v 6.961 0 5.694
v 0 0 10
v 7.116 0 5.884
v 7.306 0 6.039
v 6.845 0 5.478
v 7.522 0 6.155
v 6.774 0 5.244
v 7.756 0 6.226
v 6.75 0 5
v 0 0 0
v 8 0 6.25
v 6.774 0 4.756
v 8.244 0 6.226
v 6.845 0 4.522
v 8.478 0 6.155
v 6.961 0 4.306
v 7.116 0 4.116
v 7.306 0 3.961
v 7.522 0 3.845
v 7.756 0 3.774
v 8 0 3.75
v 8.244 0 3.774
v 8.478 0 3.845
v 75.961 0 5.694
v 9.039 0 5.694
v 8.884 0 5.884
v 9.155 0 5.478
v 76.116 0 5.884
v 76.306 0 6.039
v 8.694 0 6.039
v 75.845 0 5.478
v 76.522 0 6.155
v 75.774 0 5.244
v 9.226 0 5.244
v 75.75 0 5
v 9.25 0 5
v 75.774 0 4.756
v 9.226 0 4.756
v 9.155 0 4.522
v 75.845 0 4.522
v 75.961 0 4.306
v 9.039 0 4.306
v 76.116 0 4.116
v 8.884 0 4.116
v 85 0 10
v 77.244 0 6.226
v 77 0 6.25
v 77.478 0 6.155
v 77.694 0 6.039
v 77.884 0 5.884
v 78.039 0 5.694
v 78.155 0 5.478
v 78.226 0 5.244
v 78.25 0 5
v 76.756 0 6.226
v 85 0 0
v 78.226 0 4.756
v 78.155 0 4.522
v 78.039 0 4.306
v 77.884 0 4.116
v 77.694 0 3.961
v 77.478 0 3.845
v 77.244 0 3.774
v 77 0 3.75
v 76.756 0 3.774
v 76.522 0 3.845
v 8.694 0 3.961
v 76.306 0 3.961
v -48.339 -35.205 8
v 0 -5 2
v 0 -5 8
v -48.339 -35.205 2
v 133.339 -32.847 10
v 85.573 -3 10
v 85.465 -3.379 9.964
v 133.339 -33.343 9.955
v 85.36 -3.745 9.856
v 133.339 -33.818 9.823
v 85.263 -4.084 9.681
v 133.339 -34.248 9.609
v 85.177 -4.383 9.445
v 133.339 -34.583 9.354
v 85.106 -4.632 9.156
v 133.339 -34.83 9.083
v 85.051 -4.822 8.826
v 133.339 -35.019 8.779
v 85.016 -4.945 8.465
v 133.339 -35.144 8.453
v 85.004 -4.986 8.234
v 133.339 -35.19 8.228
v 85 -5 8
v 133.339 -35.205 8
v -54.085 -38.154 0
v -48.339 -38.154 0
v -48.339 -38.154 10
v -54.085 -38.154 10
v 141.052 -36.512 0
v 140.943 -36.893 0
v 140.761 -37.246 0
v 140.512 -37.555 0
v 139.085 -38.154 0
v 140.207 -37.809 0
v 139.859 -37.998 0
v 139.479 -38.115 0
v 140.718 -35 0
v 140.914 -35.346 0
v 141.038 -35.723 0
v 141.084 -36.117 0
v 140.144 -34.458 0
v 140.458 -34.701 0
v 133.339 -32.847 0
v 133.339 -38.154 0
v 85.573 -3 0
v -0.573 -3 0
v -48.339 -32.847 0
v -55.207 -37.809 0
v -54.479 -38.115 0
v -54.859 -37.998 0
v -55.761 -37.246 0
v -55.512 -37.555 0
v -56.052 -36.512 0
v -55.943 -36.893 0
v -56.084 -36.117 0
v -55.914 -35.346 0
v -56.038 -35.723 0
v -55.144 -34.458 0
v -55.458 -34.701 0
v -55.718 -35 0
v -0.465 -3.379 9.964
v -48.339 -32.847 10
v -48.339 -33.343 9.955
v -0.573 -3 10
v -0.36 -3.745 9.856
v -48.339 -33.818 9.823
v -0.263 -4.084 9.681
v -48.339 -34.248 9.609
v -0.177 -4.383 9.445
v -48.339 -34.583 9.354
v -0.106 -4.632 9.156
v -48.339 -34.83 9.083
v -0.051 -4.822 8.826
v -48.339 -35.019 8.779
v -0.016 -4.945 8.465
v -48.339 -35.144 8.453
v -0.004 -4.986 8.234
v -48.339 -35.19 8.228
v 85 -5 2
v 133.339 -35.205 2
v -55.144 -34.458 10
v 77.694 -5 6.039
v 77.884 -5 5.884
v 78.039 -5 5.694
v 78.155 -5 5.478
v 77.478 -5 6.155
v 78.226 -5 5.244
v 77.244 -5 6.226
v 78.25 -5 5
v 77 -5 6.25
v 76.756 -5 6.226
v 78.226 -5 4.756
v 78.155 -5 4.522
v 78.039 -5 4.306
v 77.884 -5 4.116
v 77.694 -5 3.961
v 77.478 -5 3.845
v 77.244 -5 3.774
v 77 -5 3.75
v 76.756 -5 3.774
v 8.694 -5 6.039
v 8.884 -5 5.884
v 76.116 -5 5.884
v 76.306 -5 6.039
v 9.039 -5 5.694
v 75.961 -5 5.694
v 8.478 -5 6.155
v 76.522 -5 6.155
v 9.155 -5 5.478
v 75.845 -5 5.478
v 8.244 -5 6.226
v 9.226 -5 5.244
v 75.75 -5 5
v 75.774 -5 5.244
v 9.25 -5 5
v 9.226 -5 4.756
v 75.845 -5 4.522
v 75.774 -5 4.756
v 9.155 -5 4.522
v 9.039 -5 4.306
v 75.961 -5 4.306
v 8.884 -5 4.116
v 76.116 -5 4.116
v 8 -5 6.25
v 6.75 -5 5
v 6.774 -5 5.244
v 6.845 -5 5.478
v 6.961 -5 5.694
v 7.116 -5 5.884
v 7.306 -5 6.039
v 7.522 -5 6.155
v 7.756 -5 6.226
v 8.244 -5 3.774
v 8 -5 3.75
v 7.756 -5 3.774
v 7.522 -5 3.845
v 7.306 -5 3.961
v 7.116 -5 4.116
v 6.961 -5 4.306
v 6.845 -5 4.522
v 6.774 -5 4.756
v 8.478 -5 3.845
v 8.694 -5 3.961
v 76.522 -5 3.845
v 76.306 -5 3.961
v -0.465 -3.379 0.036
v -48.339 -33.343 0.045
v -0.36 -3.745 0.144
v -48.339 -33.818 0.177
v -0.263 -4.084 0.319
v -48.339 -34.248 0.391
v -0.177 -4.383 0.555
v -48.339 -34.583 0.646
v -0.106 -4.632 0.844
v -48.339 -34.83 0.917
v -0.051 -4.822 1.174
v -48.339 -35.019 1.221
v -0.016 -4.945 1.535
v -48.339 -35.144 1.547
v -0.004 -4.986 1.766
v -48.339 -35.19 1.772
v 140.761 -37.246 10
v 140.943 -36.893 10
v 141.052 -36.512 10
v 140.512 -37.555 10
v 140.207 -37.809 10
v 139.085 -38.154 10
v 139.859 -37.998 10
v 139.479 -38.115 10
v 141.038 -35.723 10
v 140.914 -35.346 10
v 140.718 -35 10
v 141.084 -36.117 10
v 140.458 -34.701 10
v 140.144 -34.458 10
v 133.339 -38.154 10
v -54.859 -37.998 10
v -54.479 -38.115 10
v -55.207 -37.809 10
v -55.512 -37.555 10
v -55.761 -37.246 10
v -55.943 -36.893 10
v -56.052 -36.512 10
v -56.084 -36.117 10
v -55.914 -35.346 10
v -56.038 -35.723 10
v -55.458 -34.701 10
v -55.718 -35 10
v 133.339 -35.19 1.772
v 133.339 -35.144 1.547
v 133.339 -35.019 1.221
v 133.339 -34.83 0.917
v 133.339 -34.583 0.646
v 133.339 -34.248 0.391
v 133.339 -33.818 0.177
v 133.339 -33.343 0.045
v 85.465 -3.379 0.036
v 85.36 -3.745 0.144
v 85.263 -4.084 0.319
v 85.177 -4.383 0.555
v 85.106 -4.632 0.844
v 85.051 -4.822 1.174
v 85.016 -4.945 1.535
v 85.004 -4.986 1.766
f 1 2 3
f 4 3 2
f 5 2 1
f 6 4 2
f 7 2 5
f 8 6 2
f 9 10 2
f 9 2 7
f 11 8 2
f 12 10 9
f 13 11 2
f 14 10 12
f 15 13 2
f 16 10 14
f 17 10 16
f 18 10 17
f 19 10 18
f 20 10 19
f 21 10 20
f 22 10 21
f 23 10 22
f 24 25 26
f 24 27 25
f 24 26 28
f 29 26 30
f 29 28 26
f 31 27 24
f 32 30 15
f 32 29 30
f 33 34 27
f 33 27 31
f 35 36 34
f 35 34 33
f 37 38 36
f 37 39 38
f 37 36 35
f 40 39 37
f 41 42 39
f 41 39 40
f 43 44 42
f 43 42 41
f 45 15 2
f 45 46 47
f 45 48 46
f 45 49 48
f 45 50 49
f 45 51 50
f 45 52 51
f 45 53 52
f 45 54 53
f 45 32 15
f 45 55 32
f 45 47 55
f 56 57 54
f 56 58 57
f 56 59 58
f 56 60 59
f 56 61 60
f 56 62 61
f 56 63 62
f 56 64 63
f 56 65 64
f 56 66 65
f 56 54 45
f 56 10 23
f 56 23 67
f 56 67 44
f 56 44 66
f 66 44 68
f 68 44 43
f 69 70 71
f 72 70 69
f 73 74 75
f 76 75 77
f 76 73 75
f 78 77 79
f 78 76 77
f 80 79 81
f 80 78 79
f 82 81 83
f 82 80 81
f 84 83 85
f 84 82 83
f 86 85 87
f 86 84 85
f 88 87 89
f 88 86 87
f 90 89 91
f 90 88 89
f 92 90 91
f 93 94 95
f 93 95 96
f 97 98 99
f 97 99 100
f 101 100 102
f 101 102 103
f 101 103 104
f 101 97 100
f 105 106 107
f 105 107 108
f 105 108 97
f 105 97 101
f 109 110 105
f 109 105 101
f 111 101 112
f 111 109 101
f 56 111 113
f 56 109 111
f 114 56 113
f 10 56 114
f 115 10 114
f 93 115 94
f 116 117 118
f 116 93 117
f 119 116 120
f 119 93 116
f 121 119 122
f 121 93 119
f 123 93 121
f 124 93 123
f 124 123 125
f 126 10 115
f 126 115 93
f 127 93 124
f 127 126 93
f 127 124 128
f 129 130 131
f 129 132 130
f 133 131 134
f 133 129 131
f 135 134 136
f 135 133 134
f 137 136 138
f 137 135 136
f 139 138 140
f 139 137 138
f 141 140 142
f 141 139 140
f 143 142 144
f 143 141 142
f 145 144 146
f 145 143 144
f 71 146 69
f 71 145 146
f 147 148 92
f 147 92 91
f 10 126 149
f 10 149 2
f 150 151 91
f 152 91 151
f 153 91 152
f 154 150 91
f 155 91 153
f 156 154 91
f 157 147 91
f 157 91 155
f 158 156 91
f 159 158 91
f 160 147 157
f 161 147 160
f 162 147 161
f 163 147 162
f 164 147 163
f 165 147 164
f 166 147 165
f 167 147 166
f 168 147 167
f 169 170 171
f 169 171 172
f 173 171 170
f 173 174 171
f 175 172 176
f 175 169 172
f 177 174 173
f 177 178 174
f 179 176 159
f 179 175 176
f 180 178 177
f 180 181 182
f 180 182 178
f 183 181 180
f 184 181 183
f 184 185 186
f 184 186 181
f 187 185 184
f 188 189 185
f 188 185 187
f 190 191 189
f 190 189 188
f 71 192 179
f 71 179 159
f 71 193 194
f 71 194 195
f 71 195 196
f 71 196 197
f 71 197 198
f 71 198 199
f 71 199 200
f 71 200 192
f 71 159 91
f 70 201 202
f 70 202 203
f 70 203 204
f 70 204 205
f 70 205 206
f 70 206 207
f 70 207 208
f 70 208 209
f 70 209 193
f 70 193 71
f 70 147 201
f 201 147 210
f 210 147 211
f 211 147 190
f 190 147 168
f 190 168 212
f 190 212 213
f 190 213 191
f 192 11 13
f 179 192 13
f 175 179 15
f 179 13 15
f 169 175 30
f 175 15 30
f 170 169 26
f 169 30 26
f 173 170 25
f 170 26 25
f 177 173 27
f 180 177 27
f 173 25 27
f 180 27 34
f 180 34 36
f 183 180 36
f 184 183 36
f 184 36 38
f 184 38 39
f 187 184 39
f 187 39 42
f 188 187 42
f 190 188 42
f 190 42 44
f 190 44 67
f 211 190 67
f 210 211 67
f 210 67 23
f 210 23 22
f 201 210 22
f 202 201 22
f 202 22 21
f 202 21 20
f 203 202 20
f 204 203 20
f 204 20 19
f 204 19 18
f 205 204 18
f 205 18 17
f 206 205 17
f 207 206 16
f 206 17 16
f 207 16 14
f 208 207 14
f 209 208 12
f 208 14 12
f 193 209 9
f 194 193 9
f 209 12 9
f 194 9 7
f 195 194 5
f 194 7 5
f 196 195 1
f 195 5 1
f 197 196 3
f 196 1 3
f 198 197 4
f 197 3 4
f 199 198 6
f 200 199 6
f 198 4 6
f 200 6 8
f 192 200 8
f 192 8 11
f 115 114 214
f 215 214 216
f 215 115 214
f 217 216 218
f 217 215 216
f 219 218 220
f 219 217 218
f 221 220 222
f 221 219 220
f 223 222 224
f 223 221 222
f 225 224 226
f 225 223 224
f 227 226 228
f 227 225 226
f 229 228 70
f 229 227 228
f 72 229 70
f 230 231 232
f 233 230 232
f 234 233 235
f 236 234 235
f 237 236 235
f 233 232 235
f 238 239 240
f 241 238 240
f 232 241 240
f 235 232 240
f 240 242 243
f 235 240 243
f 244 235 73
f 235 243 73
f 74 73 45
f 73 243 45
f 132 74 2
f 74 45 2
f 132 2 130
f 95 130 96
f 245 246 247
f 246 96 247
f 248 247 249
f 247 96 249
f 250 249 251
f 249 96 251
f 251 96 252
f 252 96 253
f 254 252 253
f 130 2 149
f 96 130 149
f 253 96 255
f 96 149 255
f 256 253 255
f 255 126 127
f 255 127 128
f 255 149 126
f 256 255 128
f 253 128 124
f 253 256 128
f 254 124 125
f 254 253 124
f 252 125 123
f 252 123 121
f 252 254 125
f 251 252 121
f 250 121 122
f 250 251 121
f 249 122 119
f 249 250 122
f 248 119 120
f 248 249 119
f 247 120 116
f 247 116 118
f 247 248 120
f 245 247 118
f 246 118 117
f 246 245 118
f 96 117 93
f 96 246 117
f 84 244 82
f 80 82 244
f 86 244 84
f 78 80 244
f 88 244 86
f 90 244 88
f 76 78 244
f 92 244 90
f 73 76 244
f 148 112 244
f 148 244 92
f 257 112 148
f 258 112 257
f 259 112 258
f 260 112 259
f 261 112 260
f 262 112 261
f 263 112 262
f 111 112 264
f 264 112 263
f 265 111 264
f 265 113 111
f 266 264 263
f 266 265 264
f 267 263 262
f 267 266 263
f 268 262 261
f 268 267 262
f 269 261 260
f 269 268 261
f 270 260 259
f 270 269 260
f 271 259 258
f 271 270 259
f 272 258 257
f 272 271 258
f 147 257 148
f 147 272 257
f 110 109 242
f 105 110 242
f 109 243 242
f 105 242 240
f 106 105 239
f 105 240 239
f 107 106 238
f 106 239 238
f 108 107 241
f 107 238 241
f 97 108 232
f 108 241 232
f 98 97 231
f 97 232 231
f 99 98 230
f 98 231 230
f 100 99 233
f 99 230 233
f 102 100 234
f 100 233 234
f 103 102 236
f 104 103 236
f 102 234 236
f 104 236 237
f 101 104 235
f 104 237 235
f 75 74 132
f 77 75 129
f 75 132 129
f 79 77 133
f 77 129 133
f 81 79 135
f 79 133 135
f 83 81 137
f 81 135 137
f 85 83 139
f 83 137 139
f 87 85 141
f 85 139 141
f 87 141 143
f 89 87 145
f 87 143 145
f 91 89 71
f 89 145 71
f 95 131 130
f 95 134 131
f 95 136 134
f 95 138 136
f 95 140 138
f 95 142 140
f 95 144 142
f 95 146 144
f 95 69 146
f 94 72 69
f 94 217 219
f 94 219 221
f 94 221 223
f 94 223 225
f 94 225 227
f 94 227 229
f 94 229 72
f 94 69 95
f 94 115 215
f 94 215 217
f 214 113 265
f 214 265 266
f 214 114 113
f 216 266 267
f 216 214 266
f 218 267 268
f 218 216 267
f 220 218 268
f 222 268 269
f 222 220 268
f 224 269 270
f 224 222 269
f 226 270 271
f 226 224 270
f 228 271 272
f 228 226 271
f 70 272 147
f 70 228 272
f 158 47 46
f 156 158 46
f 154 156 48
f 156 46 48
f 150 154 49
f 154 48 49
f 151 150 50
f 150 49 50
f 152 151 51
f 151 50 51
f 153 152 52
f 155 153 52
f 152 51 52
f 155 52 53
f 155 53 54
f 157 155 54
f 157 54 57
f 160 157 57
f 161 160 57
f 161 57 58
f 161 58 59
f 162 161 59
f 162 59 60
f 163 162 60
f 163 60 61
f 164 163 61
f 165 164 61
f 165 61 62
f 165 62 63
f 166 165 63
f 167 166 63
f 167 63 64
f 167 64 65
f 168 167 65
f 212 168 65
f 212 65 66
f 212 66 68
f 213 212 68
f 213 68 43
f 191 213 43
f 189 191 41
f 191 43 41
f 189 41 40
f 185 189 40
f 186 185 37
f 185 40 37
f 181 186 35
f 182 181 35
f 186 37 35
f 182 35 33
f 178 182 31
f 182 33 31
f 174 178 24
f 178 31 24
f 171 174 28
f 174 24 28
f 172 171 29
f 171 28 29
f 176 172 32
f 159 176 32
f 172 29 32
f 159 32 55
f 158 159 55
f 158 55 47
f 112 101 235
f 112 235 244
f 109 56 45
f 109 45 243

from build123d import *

# Parameters (mm, degrees)
BOSS_EXTRU_2_DEPTH      = 10
ESQUISSE3_R             = 1.25
ENL_V_MAT_EXTRU_1_DEPTH = 10
CONG_1_R                = 2
CONG_2_R                = 2
CONG_3_R                = 2
CONG_4_R                = 2


with BuildPart() as part:
    # Esquisse2 → Boss.-Extru.2 (new body)
    with BuildSketch(Plane.XY):
        Polygon((0, 0), (85, 0), (146.059462923, -38.154187025), (133.338741481, -38.154187025), (133.338741481, -35.205398061), (85, -5), (0, -5), (-48.338741481, -35.205398061), (-48.338741481, -38.154187025), (-61.059462923, -38.154187025), align=None)
    extrude(amount=BOSS_EXTRU_2_DEPTH)

    # Esquisse3 → Enlèv. mat.-Extru.1 (cut)
    with BuildSketch(Plane(origin=(0, 0, 0), x_dir=(1, 0, 0), z_dir=(0, 1, 0))):
        with Locations(Location((77, -5, 0), (0, 0, 270))):
            Circle(ESQUISSE3_R)
        with Locations(Location((8, -5, 0), (0, 0, 270))):
            Circle(ESQUISSE3_R)
    extrude(amount=-ENL_V_MAT_EXTRU_1_DEPTH, mode=Mode.SUBTRACT)

    # Congé1
    cong_1_edges = [part.edges().sort_by_distance(p)[0] for p in [
        (42.5, -5, 10),
    ]]
    fillet(cong_1_edges, radius=CONG_1_R)

    # Congé2
    cong_2_edges = [part.edges().sort_by_distance(p)[0] for p in [
        (107.569036211, -19.102699031, 10),
        (109.16937074, -20.102699031, 0),
        (-22.569036211, -19.102699031, 10),
        (-24.16937074, -20.102699031, 0),
        (42.5, -5, 0),
    ]]
    fillet(cong_2_edges, radius=CONG_2_R)

    # Congé3
    cong_3_edges = [part.edges().sort_by_distance(p)[0] for p in [
        (-61.059462923, -38.154187025, 5),
    ]]
    fillet(cong_3_edges, radius=CONG_3_R)

    # Congé4
    cong_4_edges = [part.edges().sort_by_distance(p)[0] for p in [
        (146.059462923, -38.154187025, 5),
    ]]
    fillet(cong_4_edges, radius=CONG_4_R)


solid = part.part
